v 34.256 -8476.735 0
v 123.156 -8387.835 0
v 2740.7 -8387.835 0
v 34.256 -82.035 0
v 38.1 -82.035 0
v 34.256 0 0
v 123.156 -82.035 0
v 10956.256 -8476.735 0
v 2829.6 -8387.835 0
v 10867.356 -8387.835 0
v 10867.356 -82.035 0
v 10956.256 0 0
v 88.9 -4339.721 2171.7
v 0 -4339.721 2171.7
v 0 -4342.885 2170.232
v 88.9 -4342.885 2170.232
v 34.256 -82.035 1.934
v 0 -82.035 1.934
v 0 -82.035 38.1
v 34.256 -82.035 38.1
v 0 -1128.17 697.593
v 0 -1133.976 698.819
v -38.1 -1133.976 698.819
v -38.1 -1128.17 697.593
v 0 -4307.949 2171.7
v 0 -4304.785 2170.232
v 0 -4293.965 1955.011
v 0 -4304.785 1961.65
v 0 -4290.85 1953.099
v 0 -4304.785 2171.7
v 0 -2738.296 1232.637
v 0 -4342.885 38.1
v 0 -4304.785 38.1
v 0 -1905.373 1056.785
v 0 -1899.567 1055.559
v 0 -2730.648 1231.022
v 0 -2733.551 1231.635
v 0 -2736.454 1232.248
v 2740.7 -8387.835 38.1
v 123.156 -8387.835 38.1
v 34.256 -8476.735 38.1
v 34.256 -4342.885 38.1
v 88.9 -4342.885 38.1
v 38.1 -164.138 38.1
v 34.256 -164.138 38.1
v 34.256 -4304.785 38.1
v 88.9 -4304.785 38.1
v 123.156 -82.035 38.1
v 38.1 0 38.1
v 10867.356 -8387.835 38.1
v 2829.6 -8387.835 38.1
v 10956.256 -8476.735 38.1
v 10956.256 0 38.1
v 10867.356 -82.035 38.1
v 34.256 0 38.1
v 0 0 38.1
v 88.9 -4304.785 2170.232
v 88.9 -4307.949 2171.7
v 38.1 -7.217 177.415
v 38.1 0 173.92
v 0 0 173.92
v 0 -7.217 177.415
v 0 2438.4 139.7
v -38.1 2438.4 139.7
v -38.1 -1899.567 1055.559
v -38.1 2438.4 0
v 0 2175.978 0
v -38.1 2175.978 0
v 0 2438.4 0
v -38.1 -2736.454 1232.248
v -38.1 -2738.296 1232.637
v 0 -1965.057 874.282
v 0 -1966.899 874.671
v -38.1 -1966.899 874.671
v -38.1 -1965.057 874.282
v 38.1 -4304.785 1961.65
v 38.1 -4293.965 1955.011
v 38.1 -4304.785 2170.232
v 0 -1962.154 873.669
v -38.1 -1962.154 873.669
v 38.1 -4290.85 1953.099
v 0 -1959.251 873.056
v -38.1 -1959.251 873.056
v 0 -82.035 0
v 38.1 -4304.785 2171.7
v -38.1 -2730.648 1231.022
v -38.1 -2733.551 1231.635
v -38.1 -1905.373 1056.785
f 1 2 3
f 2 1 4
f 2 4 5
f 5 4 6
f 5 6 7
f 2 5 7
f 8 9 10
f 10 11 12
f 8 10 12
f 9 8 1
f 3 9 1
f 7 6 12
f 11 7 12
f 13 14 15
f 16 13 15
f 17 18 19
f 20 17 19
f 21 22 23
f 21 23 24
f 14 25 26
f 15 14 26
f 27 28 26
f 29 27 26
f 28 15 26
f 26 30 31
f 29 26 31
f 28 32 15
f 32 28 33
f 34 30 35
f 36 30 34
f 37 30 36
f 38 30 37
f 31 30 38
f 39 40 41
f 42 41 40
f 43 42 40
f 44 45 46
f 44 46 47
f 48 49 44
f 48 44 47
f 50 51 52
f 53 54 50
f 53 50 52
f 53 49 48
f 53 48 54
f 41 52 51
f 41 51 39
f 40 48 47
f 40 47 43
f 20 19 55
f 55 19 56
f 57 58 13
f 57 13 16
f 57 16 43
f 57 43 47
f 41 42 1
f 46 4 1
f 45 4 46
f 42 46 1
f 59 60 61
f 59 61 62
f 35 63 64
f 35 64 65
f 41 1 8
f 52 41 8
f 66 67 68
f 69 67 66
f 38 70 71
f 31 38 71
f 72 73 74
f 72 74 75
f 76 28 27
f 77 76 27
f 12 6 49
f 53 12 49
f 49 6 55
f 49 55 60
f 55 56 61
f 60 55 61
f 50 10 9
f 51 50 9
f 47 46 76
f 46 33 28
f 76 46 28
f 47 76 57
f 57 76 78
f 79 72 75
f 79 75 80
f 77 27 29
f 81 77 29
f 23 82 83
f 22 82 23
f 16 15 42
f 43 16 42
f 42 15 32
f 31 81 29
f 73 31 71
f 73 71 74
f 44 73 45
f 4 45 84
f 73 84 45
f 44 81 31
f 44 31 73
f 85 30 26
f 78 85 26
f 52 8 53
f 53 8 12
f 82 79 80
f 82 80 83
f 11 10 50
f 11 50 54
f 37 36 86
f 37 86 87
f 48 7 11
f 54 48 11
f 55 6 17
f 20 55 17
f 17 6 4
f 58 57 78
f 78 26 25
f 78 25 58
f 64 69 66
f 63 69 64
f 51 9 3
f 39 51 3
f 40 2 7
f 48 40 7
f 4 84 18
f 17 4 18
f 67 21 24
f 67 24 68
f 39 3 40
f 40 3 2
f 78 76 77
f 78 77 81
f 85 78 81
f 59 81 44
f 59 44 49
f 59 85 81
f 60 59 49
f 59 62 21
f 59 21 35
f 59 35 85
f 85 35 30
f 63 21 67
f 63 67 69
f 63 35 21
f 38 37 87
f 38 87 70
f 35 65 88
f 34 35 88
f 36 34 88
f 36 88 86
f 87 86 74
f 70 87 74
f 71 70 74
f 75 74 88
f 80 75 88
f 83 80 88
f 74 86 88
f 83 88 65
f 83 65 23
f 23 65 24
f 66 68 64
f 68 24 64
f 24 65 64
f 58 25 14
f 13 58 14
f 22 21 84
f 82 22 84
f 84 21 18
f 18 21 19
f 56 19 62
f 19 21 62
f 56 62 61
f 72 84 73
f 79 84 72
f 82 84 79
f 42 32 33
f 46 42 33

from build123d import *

# Parameters (mm, degrees)
F0_W     = 88.9
F0_H     = 8305.8
F1_DEPTH = 38.1
F3_DEPTH = 38.1
F6_DEPTH = 38.1
F2_W     = 19.05
F2_H     = 1422.4
F7_DEPTH = 88.9


with BuildPart() as f1:
    # F0 (on Top) → F1 (new body)
    with BuildSketch(Plane.XY):
        Polygon((34.2559893398, 0), (34.2559893398, -82.0349754334), (123.1559893398, -82.0349754333), (2774.9563753398, -82.0349754333), (2863.8563753398, -82.0349754333), (10867.3559893398, -82.0349754333), (10956.2559893398, -82.0349754333), (10956.2559893398, 0), align=None)
        with Locations((78.7059893398, -4234.9349754334)):
            Rectangle(F0_W, F0_H)
        Polygon((123.1559893398, -8387.8349754334), (34.2559893398, -8387.8349754334), (34.2559893398, -8476.7349754334), (10956.2559893398, -8476.7349754334), (10956.2559893398, -8387.8349754334), (10867.3559893398, -8387.8349754334), (2829.600386, -8387.8349754334), (2740.700386, -8387.8349754333), align=None)
        with Locations((10911.8059893398, -4234.9349754334)):
            Rectangle(F0_W, F0_H)
    extrude(amount=F1_DEPTH)

    # F2 (on Right) → F3 (join)
    with BuildSketch(Plane.YZ):
        Polygon((-4304.7849754334, 2170.231597737), (-4304.7849754334, 1961.6500800771), (-4293.965460335, 1955.0110555127), (-4290.8496340128, 1953.0991354956), (-82.0349754333, 0), (-82.0349754334, 1.9344240427), (-82.0349754334, 38.1), (0, 38.1), (0, 162.5593582531), (0, 173.9197075367), (-7.2166001264, 177.4147298146), (-4304.7849754334, 2171.7), (-4304.7849754334, 2170.9657988685), align=None)
    extrude(amount=F3_DEPTH)

    # F5 (on face) → F6 (join)
    with BuildSketch(Plane.YZ):
        Polygon((2175.9779277023, 0), (2438.4, 0), (2438.4, 139.7), (-1899.566832523, 1055.559267592), (-1128.1700381134, 697.5928246615), align=None)
        Polygon((-1128.1700381134, 697.5928246615), (-1899.566832523, 1055.559267592), (-1902.4696932972, 1056.1721381014), (-1131.0728988876, 698.2056951709), align=None)
        Polygon((-1131.0728988876, 698.2056951709), (-1902.4696932972, 1056.1721381014), (-1905.3725540714, 1056.7850086108), (-1133.9757596618, 698.8185656803), align=None)
        Polygon((-1133.9757596618, 698.8185656803), (-1905.3725540714, 1056.7850086108), (-2730.6478288415, 1231.0223962843), (-1959.2510344318, 873.0559533537), align=None)
        Polygon((-1959.2510344318, 873.0559533537), (-2730.6478288415, 1231.0223962843), (-2733.5506896157, 1231.6352667937), (-1962.153895206, 873.6688238632), align=None)
        Polygon((-1962.153895206, 873.6688238632), (-2733.5506896157, 1231.6352667937), (-2736.4535503898, 1232.2481373031), (-1965.0567559802, 874.2816943726), align=None)
        Polygon((-1965.0567559802, 874.2816943726), (-2736.4535503898, 1232.2481373031), (-2738.2960922849, 1232.6371465177), (-1966.8992978753, 874.6707035872), align=None)
    extrude(amount=-F6_DEPTH)

    # F2 (on Right) → F7 (join)
    with BuildSketch(Plane.YZ):
        Polygon((-4323.8349754334, 1460.5), (-4304.7849754334, 1460.5), (-4304.7849754334, 1961.6500800771), (-4304.7849754334, 2170.231597737), (-4307.9492966175, 2171.7), (-4323.8349754334, 2171.7), align=None)
        Polygon((-4342.8849754334, 1460.5), (-4323.8349754334, 1460.5), (-4323.8349754334, 2171.7), (-4339.7206542492, 2171.7), (-4342.8849754334, 2170.231597737), (-4342.8849754334, 1961.6500800771), align=None)
        with Locations((-4314.3099754334, 749.3)):
            Rectangle(F2_W, F2_H)
        with Locations((-4333.3599754334, 749.3)):
            Rectangle(F2_W, F2_H)
    extrude(amount=F7_DEPTH)


solid = f1.part
